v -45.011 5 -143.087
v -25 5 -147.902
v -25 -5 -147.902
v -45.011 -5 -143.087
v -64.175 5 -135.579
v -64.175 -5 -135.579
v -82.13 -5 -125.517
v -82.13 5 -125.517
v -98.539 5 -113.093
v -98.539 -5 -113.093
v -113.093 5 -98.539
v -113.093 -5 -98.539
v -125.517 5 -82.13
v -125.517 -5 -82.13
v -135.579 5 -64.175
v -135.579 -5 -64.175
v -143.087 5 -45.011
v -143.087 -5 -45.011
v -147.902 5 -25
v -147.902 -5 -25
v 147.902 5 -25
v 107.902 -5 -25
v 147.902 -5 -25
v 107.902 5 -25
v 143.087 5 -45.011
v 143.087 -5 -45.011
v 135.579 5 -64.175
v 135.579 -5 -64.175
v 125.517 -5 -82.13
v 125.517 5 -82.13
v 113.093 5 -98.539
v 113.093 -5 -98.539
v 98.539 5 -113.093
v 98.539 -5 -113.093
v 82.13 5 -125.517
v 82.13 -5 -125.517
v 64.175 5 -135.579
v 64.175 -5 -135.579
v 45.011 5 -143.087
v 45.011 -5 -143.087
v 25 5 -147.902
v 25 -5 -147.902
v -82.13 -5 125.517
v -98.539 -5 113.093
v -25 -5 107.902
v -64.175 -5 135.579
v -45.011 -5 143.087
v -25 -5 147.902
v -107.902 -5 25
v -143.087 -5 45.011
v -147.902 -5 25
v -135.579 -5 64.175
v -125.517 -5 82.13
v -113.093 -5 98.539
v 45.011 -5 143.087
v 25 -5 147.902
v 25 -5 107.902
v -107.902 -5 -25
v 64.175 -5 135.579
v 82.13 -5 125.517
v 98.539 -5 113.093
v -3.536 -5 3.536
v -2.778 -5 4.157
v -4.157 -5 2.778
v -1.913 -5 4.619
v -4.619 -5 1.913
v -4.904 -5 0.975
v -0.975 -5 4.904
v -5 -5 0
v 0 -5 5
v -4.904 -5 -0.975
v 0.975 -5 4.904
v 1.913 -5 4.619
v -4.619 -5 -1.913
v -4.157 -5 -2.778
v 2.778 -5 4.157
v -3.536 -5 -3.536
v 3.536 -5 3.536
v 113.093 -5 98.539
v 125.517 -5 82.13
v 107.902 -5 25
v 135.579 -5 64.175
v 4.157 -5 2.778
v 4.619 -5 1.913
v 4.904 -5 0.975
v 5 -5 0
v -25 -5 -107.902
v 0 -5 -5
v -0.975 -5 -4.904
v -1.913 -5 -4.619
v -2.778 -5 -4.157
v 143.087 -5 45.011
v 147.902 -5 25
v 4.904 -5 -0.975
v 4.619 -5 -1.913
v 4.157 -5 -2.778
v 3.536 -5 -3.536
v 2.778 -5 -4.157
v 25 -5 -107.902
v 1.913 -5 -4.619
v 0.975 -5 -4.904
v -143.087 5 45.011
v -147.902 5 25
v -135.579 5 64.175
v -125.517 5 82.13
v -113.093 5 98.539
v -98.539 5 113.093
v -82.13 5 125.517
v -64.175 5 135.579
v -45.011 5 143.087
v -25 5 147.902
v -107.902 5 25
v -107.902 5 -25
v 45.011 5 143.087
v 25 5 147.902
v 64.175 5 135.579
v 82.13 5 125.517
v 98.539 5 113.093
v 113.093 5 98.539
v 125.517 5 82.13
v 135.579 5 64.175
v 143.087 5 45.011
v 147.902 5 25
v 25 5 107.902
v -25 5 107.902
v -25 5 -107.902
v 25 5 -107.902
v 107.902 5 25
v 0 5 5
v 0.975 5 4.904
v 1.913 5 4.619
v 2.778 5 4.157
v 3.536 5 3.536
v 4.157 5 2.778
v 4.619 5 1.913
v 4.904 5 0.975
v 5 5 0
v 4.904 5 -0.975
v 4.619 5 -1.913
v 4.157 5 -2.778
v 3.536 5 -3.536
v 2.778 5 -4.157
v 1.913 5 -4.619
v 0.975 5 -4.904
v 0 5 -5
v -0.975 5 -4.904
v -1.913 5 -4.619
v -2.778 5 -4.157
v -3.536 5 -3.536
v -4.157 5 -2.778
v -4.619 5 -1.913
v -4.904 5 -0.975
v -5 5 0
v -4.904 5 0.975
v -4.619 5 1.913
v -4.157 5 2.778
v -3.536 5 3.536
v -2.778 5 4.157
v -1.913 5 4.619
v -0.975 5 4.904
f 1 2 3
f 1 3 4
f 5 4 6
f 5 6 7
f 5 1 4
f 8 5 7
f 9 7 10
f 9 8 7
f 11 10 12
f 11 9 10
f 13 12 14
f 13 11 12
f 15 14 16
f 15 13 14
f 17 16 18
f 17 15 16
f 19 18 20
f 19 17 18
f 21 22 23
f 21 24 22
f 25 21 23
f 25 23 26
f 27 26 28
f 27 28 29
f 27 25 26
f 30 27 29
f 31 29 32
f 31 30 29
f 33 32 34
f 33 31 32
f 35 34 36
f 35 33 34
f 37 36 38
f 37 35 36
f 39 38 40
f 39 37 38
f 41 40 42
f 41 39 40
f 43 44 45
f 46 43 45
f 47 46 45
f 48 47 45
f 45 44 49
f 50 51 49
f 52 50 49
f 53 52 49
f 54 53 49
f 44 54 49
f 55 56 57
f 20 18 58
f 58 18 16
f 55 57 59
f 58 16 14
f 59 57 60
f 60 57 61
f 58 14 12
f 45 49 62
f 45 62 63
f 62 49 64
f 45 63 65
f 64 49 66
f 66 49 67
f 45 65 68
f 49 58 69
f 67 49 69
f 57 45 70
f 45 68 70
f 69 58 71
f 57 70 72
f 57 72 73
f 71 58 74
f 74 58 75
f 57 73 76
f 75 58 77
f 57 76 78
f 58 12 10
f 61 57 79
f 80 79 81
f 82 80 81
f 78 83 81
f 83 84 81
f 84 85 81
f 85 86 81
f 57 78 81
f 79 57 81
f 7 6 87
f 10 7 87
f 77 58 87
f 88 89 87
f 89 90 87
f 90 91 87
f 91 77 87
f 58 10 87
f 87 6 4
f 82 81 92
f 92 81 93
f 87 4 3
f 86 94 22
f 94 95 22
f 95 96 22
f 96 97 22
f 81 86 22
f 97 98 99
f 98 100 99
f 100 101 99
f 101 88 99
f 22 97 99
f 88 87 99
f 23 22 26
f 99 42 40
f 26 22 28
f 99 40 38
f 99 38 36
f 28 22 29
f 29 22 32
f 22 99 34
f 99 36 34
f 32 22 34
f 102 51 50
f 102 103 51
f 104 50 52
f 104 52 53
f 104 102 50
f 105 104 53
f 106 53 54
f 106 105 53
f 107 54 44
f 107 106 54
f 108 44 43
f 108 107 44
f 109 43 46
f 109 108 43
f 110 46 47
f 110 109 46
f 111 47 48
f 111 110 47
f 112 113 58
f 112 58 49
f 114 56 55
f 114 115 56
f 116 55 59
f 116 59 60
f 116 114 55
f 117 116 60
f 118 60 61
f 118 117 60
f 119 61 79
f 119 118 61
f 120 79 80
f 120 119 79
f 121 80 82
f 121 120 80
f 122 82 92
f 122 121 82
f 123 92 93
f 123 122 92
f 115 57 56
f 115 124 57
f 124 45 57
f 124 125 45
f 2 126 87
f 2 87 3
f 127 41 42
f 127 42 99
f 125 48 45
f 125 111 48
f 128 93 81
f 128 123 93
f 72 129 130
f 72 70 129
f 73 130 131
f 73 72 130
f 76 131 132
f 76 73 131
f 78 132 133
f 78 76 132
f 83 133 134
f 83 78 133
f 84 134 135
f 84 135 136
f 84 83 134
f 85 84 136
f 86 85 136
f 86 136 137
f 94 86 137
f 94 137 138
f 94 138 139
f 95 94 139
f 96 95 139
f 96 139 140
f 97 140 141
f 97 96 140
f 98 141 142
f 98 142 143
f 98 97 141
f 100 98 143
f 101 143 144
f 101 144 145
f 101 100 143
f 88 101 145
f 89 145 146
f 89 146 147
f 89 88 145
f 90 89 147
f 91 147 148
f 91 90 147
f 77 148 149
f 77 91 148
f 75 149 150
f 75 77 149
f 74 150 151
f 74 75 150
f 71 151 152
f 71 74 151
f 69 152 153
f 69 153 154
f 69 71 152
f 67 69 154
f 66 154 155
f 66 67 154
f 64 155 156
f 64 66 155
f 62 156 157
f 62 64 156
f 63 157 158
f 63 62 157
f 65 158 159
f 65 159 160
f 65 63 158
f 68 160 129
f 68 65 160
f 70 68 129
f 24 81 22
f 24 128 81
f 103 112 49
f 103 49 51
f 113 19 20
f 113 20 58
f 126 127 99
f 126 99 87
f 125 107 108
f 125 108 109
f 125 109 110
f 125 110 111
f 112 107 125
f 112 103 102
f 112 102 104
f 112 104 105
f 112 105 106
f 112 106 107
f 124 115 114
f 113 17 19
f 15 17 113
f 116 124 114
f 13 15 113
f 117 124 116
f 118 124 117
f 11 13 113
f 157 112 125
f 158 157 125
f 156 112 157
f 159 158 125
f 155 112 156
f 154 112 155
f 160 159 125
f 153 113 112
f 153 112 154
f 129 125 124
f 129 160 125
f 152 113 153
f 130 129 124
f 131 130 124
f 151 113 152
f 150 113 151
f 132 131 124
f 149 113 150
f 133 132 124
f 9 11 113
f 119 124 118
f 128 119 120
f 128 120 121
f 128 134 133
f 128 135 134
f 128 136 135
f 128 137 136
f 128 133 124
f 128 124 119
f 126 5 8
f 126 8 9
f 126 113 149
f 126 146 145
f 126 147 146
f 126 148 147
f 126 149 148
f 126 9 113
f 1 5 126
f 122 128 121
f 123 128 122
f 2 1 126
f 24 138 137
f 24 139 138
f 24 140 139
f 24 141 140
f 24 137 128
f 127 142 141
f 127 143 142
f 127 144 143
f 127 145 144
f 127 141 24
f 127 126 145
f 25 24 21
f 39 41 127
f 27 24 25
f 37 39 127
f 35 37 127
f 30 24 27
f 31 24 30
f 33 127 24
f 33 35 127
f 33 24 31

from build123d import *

# Parameters (mm, degrees)
SKETCH2_R           = 5
BOSS_EXTRUDE1_DEPTH = 5


with BuildPart() as part:
    # Sketch2 → Boss-Extrude1 (new, symmetric)
    with BuildSketch(Plane(origin=(0, 0, 0), x_dir=(1, 0, 0), z_dir=(0, 1, 0))):
        with BuildLine():
            Line((107.901994577, 25), (147.901994577, 25))
            ThreePointArc((147.901994577, 25), (106.066017178, 106.066017178), (25, 147.901994577))
            Line((25, 147.901994577), (25, 107.901994577))
            Line((25, 107.901994577), (-25, 107.901994577))
            Line((-25, 107.901994577), (-25, 147.901994577))
            ThreePointArc((-25, 147.901994577), (-106.066017178, 106.066017178), (-147.901994577, 25))
            Line((-147.901994577, 25), (-107.901994577, 25))
            Line((-107.901994577, 25), (-107.901994577, -25))
            Line((-107.901994577, -25), (-147.901994577, -25))
            ThreePointArc((-147.901994577, -25), (-106.066017178, -106.066017178), (-25, -147.901994577))
            Line((-25, -147.901994577), (-25, -107.901994577))
            Line((-25, -107.901994577), (25, -107.901994577))
            Line((25, -107.901994577), (25, -147.901994577))
            ThreePointArc((25, -147.901994577), (106.066017178, -106.066017178), (147.901994577, -25))
            Line((147.901994577, -25), (107.901994577, -25))
            Line((107.901994577, -25), (107.901994577, 25))
        make_face()
        with Locations(Location((0, 0, 0), (0, 0, 270))):
            Circle(SKETCH2_R, mode=Mode.SUBTRACT)
    extrude(amount=BOSS_EXTRUDE1_DEPTH, both=True)


solid = part.part
